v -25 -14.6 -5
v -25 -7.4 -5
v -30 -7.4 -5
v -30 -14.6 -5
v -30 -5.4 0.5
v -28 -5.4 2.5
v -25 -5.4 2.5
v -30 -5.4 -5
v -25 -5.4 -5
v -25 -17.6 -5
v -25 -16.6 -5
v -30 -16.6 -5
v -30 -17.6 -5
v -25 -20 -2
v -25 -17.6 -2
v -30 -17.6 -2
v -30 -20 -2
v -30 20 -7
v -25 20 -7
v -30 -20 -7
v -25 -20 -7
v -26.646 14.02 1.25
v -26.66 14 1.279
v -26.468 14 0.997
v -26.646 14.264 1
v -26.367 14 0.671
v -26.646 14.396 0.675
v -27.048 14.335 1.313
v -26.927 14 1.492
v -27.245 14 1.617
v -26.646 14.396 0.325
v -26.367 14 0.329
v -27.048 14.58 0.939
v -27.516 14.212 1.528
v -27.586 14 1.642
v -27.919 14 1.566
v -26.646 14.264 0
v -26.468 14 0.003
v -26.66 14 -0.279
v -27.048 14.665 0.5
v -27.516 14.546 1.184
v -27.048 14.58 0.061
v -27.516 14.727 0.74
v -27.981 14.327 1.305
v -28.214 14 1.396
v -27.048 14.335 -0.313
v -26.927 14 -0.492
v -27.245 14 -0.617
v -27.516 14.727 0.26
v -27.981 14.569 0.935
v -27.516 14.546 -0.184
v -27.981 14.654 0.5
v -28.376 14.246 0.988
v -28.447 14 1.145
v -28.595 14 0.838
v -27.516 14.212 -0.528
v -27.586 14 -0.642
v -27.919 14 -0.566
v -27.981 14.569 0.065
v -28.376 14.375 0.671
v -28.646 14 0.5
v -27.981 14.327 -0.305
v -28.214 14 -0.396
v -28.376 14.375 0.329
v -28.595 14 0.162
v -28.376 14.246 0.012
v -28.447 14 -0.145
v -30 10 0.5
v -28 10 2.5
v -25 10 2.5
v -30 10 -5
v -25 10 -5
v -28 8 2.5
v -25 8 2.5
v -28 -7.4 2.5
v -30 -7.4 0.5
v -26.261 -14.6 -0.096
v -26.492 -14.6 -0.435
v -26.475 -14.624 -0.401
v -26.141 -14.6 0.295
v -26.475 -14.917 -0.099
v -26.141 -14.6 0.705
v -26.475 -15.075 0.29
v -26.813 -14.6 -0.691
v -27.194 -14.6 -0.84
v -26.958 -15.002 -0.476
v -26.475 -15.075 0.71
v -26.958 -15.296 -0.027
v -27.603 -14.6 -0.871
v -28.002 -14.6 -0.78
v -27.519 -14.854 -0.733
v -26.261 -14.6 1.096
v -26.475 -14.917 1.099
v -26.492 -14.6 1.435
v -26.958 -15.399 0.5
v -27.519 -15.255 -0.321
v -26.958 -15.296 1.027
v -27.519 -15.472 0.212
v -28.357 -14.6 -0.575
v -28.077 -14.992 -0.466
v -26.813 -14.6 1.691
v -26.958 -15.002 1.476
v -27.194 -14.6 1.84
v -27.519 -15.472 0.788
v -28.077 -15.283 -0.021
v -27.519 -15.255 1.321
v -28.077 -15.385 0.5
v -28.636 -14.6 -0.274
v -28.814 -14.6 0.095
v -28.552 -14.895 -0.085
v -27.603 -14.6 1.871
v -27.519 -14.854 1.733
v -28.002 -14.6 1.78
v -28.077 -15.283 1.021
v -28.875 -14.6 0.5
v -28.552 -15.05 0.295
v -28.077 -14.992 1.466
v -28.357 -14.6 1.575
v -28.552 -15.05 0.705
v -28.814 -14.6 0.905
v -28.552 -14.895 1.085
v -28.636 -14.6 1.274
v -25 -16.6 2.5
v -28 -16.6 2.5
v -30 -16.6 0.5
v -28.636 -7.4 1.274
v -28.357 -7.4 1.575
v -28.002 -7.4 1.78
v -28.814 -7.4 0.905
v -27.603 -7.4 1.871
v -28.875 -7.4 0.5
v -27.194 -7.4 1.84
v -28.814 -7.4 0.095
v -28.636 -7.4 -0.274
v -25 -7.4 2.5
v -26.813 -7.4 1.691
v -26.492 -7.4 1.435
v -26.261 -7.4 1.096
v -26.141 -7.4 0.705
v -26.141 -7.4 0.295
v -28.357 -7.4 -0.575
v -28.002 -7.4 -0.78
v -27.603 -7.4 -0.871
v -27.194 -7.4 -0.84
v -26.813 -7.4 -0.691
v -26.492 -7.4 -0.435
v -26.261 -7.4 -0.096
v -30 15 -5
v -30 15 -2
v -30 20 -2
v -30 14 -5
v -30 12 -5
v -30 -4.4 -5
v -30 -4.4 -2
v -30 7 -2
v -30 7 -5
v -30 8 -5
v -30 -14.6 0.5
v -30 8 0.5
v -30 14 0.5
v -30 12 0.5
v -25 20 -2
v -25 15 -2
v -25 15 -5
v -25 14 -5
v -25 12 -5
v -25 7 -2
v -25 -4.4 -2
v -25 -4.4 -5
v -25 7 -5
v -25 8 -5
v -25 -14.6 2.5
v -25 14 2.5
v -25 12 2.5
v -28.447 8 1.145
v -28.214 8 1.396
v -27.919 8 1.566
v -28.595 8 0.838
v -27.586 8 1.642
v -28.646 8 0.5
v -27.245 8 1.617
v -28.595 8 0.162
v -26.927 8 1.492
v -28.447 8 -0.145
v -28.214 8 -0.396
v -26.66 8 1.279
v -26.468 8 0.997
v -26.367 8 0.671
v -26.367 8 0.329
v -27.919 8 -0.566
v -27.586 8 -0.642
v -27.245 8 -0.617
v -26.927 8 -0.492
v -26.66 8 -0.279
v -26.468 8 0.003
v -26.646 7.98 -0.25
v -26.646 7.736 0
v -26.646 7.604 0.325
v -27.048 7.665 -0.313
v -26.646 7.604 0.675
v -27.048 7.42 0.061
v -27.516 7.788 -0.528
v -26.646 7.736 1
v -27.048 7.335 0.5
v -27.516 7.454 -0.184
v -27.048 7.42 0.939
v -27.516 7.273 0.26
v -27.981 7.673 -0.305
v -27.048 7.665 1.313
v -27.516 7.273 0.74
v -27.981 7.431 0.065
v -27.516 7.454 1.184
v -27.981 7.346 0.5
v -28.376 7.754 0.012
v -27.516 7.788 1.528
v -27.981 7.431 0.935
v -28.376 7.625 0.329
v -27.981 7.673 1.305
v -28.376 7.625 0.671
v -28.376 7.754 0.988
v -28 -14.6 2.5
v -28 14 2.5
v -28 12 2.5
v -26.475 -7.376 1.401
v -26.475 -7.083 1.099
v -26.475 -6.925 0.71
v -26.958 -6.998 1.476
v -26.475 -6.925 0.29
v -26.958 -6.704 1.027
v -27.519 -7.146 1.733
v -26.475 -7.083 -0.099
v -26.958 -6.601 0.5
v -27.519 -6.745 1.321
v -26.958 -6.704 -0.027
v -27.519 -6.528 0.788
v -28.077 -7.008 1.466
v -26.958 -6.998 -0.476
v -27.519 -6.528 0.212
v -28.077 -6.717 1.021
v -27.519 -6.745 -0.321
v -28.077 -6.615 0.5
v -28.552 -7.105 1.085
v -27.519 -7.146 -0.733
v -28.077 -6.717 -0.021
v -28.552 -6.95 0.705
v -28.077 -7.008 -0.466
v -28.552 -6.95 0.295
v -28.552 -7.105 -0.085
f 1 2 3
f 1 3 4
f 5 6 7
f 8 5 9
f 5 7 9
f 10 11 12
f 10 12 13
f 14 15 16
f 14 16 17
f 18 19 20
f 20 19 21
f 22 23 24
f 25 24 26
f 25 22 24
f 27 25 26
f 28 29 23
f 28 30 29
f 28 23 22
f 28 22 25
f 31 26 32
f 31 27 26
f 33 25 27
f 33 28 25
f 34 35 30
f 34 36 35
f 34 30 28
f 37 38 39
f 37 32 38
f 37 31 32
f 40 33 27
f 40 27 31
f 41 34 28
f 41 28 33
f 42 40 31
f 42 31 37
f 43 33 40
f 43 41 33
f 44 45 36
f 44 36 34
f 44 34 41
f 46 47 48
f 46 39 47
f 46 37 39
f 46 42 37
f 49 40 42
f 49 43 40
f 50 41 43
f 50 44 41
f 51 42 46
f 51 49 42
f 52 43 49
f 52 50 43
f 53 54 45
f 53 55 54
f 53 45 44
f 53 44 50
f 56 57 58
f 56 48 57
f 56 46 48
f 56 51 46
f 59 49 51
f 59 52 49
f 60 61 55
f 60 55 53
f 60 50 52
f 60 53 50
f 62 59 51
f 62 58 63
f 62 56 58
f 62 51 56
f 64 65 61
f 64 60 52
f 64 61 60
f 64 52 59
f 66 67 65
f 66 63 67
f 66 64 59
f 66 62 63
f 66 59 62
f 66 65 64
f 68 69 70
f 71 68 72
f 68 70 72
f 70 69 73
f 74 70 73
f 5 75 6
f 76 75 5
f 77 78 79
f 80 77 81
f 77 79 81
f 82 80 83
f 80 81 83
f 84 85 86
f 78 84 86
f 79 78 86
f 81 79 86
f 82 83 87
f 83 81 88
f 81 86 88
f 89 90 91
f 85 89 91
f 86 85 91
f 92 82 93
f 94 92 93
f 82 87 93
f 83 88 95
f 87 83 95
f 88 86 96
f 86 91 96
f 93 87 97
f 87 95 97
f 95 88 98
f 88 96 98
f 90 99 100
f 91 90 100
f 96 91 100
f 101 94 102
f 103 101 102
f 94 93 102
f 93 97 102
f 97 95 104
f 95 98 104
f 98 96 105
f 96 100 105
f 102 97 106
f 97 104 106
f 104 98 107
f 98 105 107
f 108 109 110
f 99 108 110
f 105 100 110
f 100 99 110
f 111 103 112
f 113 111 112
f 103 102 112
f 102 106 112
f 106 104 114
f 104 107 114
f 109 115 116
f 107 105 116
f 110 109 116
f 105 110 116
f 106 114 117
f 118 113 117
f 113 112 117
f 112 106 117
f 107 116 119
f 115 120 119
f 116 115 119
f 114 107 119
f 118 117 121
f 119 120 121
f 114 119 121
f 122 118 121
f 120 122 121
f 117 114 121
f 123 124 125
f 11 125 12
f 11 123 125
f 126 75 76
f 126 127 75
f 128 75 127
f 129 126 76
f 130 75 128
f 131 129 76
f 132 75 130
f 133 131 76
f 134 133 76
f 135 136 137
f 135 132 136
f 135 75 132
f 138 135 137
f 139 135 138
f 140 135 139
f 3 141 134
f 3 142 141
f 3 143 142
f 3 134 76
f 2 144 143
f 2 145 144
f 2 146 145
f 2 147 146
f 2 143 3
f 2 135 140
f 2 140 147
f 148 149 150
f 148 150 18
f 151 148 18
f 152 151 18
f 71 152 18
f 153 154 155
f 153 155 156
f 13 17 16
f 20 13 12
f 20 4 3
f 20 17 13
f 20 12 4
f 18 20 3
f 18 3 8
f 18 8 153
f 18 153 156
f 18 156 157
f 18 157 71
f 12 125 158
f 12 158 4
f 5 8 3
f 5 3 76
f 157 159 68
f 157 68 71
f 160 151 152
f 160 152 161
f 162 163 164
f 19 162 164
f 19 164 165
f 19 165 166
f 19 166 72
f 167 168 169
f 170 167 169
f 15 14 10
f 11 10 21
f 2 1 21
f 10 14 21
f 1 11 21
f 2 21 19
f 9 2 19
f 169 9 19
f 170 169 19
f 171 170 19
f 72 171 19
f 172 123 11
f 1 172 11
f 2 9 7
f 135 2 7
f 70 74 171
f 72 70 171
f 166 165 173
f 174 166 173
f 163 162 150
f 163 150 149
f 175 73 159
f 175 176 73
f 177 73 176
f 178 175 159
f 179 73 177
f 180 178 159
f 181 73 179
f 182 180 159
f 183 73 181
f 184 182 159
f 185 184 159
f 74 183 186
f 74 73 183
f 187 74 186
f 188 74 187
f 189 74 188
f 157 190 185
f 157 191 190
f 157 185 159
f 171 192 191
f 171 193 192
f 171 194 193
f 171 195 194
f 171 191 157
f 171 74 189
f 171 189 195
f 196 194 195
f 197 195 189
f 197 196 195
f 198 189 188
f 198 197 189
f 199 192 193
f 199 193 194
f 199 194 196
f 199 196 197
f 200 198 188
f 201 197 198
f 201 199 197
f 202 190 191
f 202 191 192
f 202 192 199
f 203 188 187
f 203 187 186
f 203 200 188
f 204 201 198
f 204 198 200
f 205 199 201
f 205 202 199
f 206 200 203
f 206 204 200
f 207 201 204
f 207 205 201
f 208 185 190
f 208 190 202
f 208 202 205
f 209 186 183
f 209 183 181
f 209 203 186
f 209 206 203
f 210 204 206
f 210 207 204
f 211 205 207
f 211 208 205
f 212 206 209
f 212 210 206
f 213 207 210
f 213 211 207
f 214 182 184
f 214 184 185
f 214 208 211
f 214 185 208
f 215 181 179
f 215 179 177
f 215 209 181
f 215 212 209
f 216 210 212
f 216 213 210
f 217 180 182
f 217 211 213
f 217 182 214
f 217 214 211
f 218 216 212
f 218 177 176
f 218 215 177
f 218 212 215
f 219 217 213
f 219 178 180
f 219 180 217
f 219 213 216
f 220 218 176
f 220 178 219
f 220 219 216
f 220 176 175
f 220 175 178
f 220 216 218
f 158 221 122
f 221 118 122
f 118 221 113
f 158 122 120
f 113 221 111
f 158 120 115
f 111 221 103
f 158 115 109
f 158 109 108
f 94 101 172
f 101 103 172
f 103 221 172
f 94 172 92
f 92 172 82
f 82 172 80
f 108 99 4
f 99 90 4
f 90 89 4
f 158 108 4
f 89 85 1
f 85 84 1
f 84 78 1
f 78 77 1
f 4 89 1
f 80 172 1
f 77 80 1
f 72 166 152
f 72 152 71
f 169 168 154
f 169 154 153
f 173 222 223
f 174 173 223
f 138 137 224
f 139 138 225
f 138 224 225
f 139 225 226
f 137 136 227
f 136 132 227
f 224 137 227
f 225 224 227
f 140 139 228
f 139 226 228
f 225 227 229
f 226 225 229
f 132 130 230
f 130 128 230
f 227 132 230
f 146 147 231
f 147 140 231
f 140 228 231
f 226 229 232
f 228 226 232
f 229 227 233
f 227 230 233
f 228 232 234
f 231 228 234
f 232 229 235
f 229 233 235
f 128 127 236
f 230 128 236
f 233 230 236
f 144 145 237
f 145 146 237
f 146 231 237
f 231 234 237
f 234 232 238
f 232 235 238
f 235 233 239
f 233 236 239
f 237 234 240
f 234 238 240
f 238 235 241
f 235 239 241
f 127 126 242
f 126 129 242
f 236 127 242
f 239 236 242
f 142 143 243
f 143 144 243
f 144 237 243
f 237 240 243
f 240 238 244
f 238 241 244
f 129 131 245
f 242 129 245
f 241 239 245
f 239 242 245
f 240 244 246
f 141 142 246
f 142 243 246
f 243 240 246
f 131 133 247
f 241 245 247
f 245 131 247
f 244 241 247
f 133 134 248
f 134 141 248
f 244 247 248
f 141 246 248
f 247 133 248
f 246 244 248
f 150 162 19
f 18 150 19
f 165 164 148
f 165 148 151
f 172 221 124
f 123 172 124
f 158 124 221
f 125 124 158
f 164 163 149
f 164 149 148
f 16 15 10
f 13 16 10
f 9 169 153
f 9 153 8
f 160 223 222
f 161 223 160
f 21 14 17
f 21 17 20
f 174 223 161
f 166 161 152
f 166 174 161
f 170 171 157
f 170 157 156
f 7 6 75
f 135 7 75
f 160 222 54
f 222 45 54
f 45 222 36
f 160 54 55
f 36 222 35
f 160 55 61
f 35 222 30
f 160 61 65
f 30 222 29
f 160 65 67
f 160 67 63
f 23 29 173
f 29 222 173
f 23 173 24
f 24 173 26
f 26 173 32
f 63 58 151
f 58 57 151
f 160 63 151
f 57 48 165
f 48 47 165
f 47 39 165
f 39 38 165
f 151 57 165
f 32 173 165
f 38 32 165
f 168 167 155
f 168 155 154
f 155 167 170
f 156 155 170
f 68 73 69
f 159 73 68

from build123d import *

# Parameters (mm, degrees)
BOX155_W               = 13
BOX155_H               = 40
BOX155_DEPTH           = 10
BOX155_PITCH_ANGLE     = -45
BOX163_W               = 12
BOX163_H               = 44
BOX163_DEPTH           = 10
BOX162_W               = 20
BOX162_H               = 44
BOX162_DEPTH           = 10
BOX158_W               = 4
BOX158_H               = 1
BOX158_DEPTH           = 7
BOX160_W               = 4
BOX160_H               = 1
BOX160_DEPTH           = 7
BOX157_W               = 4
BOX157_H               = 2
BOX157_DEPTH           = 7
BOX159_W               = 4
BOX159_H               = 1
BOX159_DEPTH           = 7
BOX156_W               = 4
BOX156_H               = 1
BOX156_DEPTH           = 7
BOX161_W               = 4
BOX161_H               = 7.2
BOX161_DEPTH           = 7
BOX151_W               = 10
BOX151_H               = 2
BOX151_DEPTH           = 7
BOX152_W               = 10
BOX152_H               = 2
BOX152_DEPTH           = 7
BOX153_W               = 10
BOX153_H               = 2
BOX153_DEPTH           = 7
BOX154_W               = 10
BOX154_H               = 2
BOX154_DEPTH           = 7
BOX150_W               = 5
BOX150_H               = 40
BOX150_DEPTH           = 7
CUT064_PITCH_ANGLE     = 90
CUT064_PLACEMENT_ANGLE = -180


with BuildPart() as chamfer_cube001:
    # Box155 → Box155 (new body)
    with BuildSketch(Plane.XY):
        with Locations((6.5, 20)):
            Rectangle(BOX155_W, BOX155_H)
    extrude(amount=BOX155_DEPTH)


with BuildPart() as chamfer_cube001_1:
    # Box155 pitch: moved
    add(chamfer_cube001.part.rotate(Axis((0, 0, 0), (0, 1, 0)), BOX155_PITCH_ANGLE))


with BuildPart() as chamfer_cube001_2:
    # Box155 placement: moved
    add(chamfer_cube001_1.part.moved(Location((-11.69, 0, -1.19))))


with BuildPart() as re_level_edge_clip_block003:
    # Box163 → Box163 (new body)
    with BuildSketch(Plane(origin=(-21.5, -2, -7), x_dir=(1, 0, 0), z_dir=(0, 0, 1))):
        with Locations((6, 22)):
            Rectangle(BOX163_W, BOX163_H)
    extrude(amount=BOX163_DEPTH)


with BuildPart() as re_level_edge_clip_block002:
    # Box162 → Box162 (new body)
    with BuildSketch(Plane(origin=(-19, -2, 3), x_dir=(1, 0, 0), z_dir=(0, 0, 1))):
        with Locations((10, 22)):
            Rectangle(BOX162_W, BOX162_H)
    extrude(amount=BOX162_DEPTH)


with BuildPart() as cube140:
    # Box158 → Box158 (new body)
    with BuildSketch(Plane(origin=(-6, 12, -2), x_dir=(1, 0, 0), z_dir=(0, 0, 1))):
        with Locations((2, 0.5)):
            Rectangle(BOX158_W, BOX158_H)
    extrude(amount=BOX158_DEPTH)


with BuildPart() as cube142:
    # Box160 → Box160 (new body)
    with BuildSketch(Plane(origin=(-6, 36.6, -2), x_dir=(1, 0, 0), z_dir=(0, 0, 1))):
        with Locations((2, 0.5)):
            Rectangle(BOX160_W, BOX160_H)
    extrude(amount=BOX160_DEPTH)


with BuildPart() as cube139:
    # Box157 → Box157 (new body)
    with BuildSketch(Plane(origin=(-6, 8, -2), x_dir=(1, 0, 0), z_dir=(0, 0, 1))):
        with Locations((2, 1)):
            Rectangle(BOX157_W, BOX157_H)
    extrude(amount=BOX157_DEPTH)


with BuildPart() as cube141:
    # Box159 → Box159 (new body)
    with BuildSketch(Plane(origin=(-6, 24.4, -2), x_dir=(1, 0, 0), z_dir=(0, 0, 1))):
        with Locations((2, 0.5)):
            Rectangle(BOX159_W, BOX159_H)
    extrude(amount=BOX159_DEPTH)


with BuildPart() as cube138:
    # Box156 → Box156 (new body)
    with BuildSketch(Plane(origin=(-6, 5, -2), x_dir=(1, 0, 0), z_dir=(0, 0, 1))):
        with Locations((2, 0.5)):
            Rectangle(BOX156_W, BOX156_H)
    extrude(amount=BOX156_DEPTH)


with BuildPart() as extra_holes_for_clips001:
    # Box161 → Box161 (new body)
    with BuildSketch(Plane(origin=(-6, 27.4, -2), x_dir=(1, 0, 0), z_dir=(0, 0, 1))):
        with Locations((2, 3.6)):
            Rectangle(BOX161_W, BOX161_H)
    extrude(amount=BOX161_DEPTH)

    # Fusion056: union Cube140, Cube142, Cube139, Cube141, Cube138
    add(cube140.part)
    add(cube142.part)
    add(cube139.part)
    add(cube141.part)
    add(cube138.part)


with BuildPart() as sphere054:
    # Sphere054 → Sphere054 (revolve)
    with BuildSketch(Plane(origin=(-7.5, 34, 0.5), x_dir=(1, 0, 0), z_dir=(0, -1, 0))):
        with BuildLine():
            ThreePointArc((0, -1.5), (1.5, 0), (0, 1.5))
            Line((0, 1.5), (0, -1.5))
        make_face()
    revolve(axis=Axis((-7.5, 34, 0.5), (0, 0, 1)))


with BuildPart() as holes001:
    # Sphere053 → Sphere053 (revolve)
    with BuildSketch(Plane(origin=(-7.5, 28, 0.5), x_dir=(1, 0, 0), z_dir=(0, -1, 0))):
        with BuildLine():
            ThreePointArc((0, -1.5), (1.5, 0), (0, 1.5))
            Line((0, 1.5), (0, -1.5))
        make_face()
    revolve(axis=Axis((-7.5, 28, 0.5), (0, 0, 1)))

    # Fusion058: union Sphere054
    add(sphere054.part)


with BuildPart() as cube134:
    # Box151 → Box151 (new body)
    with BuildSketch(Plane(origin=(-15, 6, -2), x_dir=(1, 0, 0), z_dir=(0, 0, 1))):
        with Locations((5, 1)):
            Rectangle(BOX151_W, BOX151_H)
    extrude(amount=BOX151_DEPTH)


with BuildPart() as cube135:
    # Box152 → Box152 (new body)
    with BuildSketch(Plane(origin=(-15, 10, -2), x_dir=(1, 0, 0), z_dir=(0, 0, 1))):
        with Locations((5, 1)):
            Rectangle(BOX152_W, BOX152_H)
    extrude(amount=BOX152_DEPTH)


with BuildPart() as cube136:
    # Box153 → Box153 (new body)
    with BuildSketch(Plane(origin=(-15, 25.4, -2), x_dir=(1, 0, 0), z_dir=(0, 0, 1))):
        with Locations((5, 1)):
            Rectangle(BOX153_W, BOX153_H)
    extrude(amount=BOX153_DEPTH)


with BuildPart() as cube137:
    # Box154 → Box154 (new body)
    with BuildSketch(Plane(origin=(-15, 34.6, -2), x_dir=(1, 0, 0), z_dir=(0, 0, 1))):
        with Locations((5, 1)):
            Rectangle(BOX154_W, BOX154_H)
    extrude(amount=BOX154_DEPTH)


with BuildPart() as fusion059:
    # Box150 → Box150 (new body)
    with BuildSketch(Plane(origin=(-5, 0, -2), x_dir=(1, 0, 0), z_dir=(0, 0, 1))):
        with Locations((2.5, 20)):
            Rectangle(BOX150_W, BOX150_H)
    extrude(amount=BOX150_DEPTH)

    # Fusion059: union Cube134, Cube135, Cube136, Cube137
    add(cube134.part)
    add(cube135.part)
    add(cube136.part)
    add(cube137.part)


with BuildPart() as sphere052:
    # Sphere052 → Sphere052 (revolve)
    with BuildSketch(Plane(origin=(-7.5, 11.5, 0.5), x_dir=(1, 0, 0), z_dir=(0, -1, 0))):
        with BuildLine():
            ThreePointArc((0, -1.25), (1.25, 0), (0, 1.25))
            Line((0, 1.25), (0, -1.25))
        make_face()
    revolve(axis=Axis((-7.5, 11.5, 0.5), (0, 0, 1)))


with BuildPart() as copy_edge_clip:
    # Sphere051 → Sphere051 (revolve)
    with BuildSketch(Plane(origin=(-7.5, 6.5, 0.5), x_dir=(1, 0, 0), z_dir=(0, -1, 0))):
        with BuildLine():
            ThreePointArc((0, -1.25), (1.25, 0), (0, 1.25))
            Line((0, 1.25), (0, -1.25))
        make_face()
    revolve(axis=Axis((-7.5, 6.5, 0.5), (0, 0, 1)))

    # Fusion057: union Sphere052
    add(sphere052.part)

    # Fusion060: union Fusion059
    add(fusion059.part)

    # Cut060: cut Holes001
    add(holes001.part, mode=Mode.SUBTRACT)

    # Cut061: cut Extra Holes for Clips001
    add(extra_holes_for_clips001.part, mode=Mode.SUBTRACT)

    # Cut062: cut Re-level Edge Clip Block002
    add(re_level_edge_clip_block002.part, mode=Mode.SUBTRACT)

    # Cut063: cut Re-level Edge Clip Block003
    add(re_level_edge_clip_block003.part, mode=Mode.SUBTRACT)

    # Cut064: cut Chamfer Cube001
    add(chamfer_cube001_2.part, mode=Mode.SUBTRACT)


with BuildPart() as copy_edge_clip_1:
    # Cut064 pitch: moved
    add(copy_edge_clip.part.rotate(Axis((0, 0, 0), (0, 1, 0)), CUT064_PITCH_ANGLE))


with BuildPart() as copy_edge_clip_2:
    # Cut064 placement: moved
    add(copy_edge_clip_1.part.moved(Location((-27, 20, -7))).rotate(Axis((-27, 20, -7), (0, 0, 1)), CUT064_PLACEMENT_ANGLE))


solid = copy_edge_clip_2.part
